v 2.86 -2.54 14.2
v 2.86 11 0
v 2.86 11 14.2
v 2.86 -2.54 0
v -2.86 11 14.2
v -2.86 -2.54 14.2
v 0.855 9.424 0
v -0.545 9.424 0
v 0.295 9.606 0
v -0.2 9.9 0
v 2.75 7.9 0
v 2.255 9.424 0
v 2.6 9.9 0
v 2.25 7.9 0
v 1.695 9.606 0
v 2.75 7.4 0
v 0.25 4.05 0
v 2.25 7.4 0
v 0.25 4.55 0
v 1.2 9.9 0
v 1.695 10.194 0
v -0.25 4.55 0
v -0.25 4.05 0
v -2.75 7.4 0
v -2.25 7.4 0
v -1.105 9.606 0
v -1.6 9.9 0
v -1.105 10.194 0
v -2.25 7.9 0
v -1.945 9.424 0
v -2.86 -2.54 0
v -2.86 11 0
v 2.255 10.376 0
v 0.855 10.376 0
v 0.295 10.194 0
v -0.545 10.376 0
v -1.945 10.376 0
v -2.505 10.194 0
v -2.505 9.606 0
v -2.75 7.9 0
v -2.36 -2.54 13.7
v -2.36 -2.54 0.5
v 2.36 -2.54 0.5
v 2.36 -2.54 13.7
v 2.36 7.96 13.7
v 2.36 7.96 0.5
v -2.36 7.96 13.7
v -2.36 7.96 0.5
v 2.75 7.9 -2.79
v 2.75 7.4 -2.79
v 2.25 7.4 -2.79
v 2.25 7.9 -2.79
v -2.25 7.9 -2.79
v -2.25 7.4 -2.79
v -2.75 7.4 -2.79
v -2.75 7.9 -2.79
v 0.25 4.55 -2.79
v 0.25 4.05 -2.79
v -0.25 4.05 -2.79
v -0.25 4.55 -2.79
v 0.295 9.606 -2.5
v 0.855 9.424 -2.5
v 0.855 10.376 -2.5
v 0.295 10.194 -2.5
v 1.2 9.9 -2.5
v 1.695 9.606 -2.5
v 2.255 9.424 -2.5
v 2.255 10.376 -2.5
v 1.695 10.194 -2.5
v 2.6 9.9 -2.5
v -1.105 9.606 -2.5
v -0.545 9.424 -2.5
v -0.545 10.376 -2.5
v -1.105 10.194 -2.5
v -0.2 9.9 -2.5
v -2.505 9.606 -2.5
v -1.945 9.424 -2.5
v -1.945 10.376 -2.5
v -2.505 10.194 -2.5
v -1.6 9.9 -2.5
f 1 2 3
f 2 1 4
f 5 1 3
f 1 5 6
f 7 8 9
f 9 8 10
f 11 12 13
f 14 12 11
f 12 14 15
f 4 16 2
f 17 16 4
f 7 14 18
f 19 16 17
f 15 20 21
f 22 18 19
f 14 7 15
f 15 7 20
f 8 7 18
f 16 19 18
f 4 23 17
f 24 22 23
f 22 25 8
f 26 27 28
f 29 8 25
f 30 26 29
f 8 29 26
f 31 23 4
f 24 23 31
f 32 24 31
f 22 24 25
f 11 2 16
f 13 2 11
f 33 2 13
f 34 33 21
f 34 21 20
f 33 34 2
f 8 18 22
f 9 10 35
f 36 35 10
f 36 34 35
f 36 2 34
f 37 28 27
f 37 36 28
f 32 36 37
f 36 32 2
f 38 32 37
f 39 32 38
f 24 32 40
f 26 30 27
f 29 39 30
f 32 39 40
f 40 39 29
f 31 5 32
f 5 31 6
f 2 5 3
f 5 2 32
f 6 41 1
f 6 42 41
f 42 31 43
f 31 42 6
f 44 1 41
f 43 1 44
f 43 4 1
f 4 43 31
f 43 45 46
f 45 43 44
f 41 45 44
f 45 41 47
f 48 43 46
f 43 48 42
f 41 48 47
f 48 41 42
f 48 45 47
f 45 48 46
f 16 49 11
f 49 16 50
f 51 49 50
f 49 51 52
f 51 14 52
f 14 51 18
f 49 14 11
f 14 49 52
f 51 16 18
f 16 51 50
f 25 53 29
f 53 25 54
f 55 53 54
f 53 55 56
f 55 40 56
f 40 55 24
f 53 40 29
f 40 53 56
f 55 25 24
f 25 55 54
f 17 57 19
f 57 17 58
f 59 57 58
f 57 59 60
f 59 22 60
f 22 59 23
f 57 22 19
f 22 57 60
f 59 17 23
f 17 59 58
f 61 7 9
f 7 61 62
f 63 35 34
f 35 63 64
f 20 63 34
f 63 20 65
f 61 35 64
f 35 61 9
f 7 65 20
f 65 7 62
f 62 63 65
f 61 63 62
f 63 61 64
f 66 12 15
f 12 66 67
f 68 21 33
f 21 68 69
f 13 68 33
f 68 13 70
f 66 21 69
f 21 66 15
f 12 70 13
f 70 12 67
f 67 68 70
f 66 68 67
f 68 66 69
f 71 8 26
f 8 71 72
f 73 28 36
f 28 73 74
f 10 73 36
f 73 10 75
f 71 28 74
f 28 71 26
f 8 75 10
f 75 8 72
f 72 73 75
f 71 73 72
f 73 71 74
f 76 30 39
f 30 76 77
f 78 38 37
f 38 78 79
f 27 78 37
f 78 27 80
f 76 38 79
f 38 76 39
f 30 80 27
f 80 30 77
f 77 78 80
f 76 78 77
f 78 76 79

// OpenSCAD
// extend 2.54 in y to cope with the acutal part on hand
translate([-5.72/2,-2.54,0])
difference(){
cube([5.72, 11+2.54, 14.2]);
translate([.5,-.5,.5])
    cube([5.72-1, 11, 14.2-1]);
}

translate([5.5/2-.5, 7.4, -2.79])
    cube([.5,.5,2.79]);  
translate([-5.5/2, 7.4, -2.79])
    cube([.5,.5,2.79]);  

translate([-.5/2, 7.4-3.1-.5/2, -2.79])
    cube([.5,.5,2.79]);

translate([ 1.4/2, 7.4+2.5, -2.5])
cylinder(2.5, .5, .5);

translate([ 4.2/2, 7.4+2.5, -2.5])
cylinder(2.5, .5, .5);

translate([ -1.4/2, 7.4+2.5, -2.5])
cylinder(2.5, .5, .5);

translate([ -4.2/2, 7.4+2.5, -2.5])
cylinder(2.5, .5, .5);
